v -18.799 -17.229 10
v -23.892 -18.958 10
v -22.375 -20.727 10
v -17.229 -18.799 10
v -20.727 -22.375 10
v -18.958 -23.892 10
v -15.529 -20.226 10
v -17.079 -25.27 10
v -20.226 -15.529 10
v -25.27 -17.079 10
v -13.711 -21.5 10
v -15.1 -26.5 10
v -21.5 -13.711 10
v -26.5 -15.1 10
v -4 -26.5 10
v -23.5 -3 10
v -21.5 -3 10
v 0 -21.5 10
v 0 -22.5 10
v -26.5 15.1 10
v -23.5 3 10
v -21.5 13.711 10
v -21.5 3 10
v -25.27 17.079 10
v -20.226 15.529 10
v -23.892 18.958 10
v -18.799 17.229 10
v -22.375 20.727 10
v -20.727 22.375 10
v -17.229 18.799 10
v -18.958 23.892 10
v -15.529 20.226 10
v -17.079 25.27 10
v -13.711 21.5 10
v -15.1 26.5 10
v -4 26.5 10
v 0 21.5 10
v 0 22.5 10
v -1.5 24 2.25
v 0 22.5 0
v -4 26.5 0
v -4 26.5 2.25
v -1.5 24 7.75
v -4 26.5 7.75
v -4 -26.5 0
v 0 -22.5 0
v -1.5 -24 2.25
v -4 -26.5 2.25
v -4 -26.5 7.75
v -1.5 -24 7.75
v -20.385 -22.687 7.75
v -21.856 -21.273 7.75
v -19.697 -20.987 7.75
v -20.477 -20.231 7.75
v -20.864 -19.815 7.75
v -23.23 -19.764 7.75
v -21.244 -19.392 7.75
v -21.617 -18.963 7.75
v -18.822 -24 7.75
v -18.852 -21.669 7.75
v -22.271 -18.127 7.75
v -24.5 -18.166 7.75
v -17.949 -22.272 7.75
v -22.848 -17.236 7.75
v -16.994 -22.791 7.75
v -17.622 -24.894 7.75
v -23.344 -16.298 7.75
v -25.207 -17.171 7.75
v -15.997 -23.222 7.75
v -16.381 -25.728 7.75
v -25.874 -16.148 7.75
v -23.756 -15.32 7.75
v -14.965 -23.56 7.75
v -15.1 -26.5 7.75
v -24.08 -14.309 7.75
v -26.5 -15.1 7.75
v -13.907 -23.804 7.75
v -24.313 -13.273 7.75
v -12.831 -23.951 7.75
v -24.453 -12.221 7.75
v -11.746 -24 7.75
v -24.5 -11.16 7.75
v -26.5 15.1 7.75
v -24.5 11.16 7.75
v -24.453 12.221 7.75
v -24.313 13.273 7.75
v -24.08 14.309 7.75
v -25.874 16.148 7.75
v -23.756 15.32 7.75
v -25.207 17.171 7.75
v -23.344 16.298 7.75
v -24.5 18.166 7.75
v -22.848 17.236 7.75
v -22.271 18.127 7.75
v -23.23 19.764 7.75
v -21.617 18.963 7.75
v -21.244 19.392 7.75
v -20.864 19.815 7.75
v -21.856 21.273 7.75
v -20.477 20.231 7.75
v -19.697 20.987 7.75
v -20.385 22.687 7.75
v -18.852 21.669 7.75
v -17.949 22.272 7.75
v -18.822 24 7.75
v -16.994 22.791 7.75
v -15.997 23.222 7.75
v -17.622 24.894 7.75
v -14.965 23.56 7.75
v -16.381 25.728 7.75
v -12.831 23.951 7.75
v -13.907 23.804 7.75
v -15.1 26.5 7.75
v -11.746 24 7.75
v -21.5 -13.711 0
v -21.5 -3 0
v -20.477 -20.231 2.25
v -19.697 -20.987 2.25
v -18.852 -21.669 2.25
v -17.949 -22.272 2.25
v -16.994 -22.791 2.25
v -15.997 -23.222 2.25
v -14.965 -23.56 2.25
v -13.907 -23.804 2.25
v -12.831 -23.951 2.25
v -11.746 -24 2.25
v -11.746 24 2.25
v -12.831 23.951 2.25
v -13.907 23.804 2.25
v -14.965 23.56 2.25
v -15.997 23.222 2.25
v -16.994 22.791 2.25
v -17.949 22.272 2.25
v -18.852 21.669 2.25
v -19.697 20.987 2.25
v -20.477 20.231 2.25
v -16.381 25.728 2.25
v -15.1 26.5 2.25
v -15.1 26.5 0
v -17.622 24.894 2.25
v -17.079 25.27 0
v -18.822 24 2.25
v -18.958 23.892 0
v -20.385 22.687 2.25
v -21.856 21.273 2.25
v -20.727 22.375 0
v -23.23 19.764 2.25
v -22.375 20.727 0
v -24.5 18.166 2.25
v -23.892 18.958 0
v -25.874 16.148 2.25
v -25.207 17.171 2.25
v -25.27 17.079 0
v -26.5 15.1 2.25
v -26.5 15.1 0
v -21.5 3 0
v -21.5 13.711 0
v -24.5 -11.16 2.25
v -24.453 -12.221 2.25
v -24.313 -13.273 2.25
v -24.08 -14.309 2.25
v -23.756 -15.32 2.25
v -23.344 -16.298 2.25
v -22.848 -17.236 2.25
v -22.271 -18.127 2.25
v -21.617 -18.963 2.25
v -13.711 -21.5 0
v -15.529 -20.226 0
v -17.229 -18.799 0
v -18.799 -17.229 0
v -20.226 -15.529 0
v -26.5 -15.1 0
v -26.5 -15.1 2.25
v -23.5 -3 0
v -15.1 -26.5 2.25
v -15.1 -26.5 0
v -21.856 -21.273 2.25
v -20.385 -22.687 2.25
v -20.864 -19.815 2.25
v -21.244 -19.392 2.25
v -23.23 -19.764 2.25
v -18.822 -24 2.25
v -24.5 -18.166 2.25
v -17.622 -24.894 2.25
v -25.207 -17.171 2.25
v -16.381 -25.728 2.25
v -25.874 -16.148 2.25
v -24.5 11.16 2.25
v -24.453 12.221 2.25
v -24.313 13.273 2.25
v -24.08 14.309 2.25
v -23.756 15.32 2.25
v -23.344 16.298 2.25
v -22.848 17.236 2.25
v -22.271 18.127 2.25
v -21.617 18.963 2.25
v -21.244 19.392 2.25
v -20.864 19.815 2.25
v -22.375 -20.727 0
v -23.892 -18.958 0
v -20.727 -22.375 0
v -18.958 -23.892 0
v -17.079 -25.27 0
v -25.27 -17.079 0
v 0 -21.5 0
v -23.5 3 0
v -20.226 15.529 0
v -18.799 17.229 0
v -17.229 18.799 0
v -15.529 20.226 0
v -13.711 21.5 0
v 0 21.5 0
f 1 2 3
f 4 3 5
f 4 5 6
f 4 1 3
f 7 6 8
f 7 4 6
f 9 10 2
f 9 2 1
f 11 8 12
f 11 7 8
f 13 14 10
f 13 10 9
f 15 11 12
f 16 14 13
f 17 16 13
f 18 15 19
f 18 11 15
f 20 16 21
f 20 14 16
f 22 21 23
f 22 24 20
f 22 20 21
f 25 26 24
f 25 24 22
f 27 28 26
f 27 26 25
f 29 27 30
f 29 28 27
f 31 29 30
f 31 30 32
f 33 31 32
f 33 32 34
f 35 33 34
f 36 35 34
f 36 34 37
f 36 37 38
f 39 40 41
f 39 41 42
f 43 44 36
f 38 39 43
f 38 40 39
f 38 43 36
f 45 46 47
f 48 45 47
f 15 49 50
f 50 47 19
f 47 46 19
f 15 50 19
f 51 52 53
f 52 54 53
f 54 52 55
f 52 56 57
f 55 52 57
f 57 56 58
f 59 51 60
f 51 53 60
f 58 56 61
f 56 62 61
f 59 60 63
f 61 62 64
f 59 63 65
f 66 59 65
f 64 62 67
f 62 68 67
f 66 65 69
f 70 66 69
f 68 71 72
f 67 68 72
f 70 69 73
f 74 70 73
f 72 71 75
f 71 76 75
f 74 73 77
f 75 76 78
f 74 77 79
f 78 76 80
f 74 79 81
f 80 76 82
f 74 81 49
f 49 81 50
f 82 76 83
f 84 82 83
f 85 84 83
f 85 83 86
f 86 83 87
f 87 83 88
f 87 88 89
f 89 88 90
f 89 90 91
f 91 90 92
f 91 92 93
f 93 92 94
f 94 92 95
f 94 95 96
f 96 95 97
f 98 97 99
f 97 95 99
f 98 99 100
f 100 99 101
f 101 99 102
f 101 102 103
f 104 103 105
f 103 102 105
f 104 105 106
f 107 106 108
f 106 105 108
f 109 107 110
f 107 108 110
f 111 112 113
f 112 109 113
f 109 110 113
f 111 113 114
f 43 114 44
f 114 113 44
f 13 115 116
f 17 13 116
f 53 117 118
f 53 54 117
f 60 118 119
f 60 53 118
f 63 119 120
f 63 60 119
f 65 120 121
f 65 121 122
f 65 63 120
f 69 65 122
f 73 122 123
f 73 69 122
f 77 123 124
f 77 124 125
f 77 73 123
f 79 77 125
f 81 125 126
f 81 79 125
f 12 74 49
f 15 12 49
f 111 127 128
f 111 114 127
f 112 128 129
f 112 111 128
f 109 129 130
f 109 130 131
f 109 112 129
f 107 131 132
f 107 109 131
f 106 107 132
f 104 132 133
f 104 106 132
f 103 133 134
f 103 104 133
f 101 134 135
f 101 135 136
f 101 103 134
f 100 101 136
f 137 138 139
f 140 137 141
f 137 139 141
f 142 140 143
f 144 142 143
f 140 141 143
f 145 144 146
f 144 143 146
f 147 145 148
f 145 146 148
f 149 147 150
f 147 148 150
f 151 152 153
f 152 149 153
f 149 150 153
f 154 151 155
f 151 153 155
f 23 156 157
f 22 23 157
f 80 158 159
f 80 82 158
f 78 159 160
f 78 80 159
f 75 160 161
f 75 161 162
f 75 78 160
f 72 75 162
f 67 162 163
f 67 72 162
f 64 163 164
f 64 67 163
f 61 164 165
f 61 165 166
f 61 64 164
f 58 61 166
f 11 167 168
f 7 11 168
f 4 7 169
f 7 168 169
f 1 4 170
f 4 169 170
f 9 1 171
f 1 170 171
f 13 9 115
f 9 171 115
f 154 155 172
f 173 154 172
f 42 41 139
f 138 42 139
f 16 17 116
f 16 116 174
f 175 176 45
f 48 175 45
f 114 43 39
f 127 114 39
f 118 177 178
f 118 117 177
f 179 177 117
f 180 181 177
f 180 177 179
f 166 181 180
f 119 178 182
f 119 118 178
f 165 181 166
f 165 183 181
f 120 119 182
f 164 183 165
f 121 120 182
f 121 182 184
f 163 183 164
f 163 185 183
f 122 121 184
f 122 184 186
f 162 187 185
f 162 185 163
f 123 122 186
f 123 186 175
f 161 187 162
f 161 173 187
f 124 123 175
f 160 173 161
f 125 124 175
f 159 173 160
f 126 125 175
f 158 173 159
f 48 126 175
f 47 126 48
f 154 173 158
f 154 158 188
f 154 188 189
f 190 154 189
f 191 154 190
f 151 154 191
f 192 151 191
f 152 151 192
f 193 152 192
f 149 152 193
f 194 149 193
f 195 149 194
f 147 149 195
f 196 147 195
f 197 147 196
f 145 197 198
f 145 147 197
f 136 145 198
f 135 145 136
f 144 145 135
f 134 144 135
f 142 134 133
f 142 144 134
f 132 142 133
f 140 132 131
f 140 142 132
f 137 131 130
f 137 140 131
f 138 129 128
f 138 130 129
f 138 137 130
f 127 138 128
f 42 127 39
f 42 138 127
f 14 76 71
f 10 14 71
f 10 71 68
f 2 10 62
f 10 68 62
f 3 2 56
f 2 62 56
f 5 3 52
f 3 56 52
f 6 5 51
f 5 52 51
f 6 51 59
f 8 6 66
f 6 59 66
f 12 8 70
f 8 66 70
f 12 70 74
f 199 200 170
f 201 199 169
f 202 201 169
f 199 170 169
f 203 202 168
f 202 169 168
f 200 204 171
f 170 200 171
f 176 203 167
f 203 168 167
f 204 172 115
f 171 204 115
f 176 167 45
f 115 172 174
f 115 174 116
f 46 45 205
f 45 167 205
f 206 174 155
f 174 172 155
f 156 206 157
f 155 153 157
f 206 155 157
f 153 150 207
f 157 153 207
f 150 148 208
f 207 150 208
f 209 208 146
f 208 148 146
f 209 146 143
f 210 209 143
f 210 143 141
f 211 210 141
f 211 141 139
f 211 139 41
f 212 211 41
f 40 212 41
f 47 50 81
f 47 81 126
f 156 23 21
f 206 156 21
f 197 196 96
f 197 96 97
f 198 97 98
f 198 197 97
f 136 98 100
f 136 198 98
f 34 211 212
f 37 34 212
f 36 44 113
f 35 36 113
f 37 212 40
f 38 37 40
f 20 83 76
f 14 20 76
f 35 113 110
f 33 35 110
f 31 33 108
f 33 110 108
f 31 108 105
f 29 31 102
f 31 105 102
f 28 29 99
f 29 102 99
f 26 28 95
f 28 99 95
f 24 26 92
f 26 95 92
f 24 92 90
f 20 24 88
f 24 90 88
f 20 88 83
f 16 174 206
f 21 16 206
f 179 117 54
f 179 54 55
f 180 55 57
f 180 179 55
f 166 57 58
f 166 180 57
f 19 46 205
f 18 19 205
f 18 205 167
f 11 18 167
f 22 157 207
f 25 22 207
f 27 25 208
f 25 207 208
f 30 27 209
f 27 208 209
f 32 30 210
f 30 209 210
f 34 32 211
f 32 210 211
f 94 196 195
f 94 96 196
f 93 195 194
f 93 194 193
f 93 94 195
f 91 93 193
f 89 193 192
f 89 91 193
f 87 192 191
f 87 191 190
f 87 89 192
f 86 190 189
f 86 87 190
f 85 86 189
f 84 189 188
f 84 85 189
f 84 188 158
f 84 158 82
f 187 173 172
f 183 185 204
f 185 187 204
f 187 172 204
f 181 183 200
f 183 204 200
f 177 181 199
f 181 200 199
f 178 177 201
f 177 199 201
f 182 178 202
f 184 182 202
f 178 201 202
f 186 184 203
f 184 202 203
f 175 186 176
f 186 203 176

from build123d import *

# Parameters (mm, degrees)
BOSS_EXTRUDE1_DEPTH     = 10
CUT_EXTRUDE1_DEPTH      = 47.99468055
SKETCH8_W               = 5.5
SKETCH8_H               = 5
CUT_EXTRUDE7_DEPTH      = 47.99468055
CUT_EXTRUDE8_DEPTH      = 52.994106262
CUT_EXTRUDE8_DEPTH_BACK = 52.994106262
SKETCH9_W               = 4
SKETCH9_H               = 5.5
FILLET4_R               = 1.5
CUT_EXTRUDE9_DEPTH      = 5.5
CHAMFER1_SIZE           = 4
SKETCH11_W              = 11
SKETCH11_H              = 16.199337742
SKETCH11_W_2            = 4
SKETCH11_H_2            = 6
CUT_EXTRUDE10_DEPTH     = 47.99468055
FILLET5_R               = 12


with BuildPart() as part:
    # Sketch1 → Boss-Extrude1 (new body)
    with BuildSketch(Plane.XY):
        with BuildLine():
            Line((-26.5, -8.099668871), (-26.5, -15.099668871))
            ThreePointArc((-26.5, -15.099668871), (-21.566756826, -21.566756826), (-15.099668871, -26.5))
            Line((-15.099668871, -26.5), (0, -26.5))
            Line((0, -26.5), (0, -21.5))
            Line((0, -21.5), (-13.711309201, -21.5))
            ThreePointArc((-13.711309201, -21.5), (-18.03122292, -18.03122292), (-21.5, -13.711309201))
            Line((-21.5, -13.711309201), (-21.5, 13.711309201))
            ThreePointArc((-21.5, 13.711309201), (-18.03122292, 18.03122292), (-13.711309201, 21.5))
            Line((-13.711309201, 21.5), (0, 21.5))
            Line((0, 21.5), (0, 26.5))
            Line((0, 26.5), (-15.099668871, 26.5))
            ThreePointArc((-15.099668871, 26.5), (-21.566756826, 21.566756826), (-26.5, 15.099668871))
            Line((-26.5, 15.099668871), (-26.5, 8.099668871))
            Line((-26.5, 8.099668871), (-37.5, 8.099668871))
            Line((-37.5, 8.099668871), (-37.5, -8.099668871))
            Line((-37.5, -8.099668871), (-26.5, -8.099668871))
        make_face()
    extrude(amount=BOSS_EXTRUDE1_DEPTH)

    # Sketch2 → Cut-Extrude1 (cut, through all)
    with BuildSketch(Plane.XY.offset(10)):
        with BuildLine():
            Line((-31, 2.907722565), (-31, -2.907722565))
            ThreePointArc((-31, -2.907722565), (-33, -4.907722565), (-35, -2.907722565))
            Line((-35, -2.907722565), (-35, 2.907722565))
            ThreePointArc((-35, 2.907722565), (-33, 4.907722565), (-31, 2.907722565))
        make_face()
    extrude(amount=-CUT_EXTRUDE1_DEPTH, mode=Mode.SUBTRACT)

    # Sketch8 → Cut-Extrude7 (cut, through all)
    with BuildSketch(Plane(origin=(0, 0, 0), x_dir=(0, 0, -1), z_dir=(1, 0, 0))):
        with Locations((-5, 26.5)):
            Rectangle(SKETCH8_W, SKETCH8_H)
        with Locations((-5, -26.5)):
            Rectangle(SKETCH8_W, SKETCH8_H)
    extrude(amount=-CUT_EXTRUDE7_DEPTH, mode=Mode.SUBTRACT)

    # Sketch9 → Cut-Extrude8 (cut, two sides: drawn at the far end of the back side and taken through both)
    with BuildSketch(Plane.XZ.offset(8.099668871).offset(-CUT_EXTRUDE8_DEPTH_BACK)):
        with Locations((-26.5, 5)):
            Rectangle(SKETCH9_W, SKETCH9_H)
    extrude(amount=CUT_EXTRUDE8_DEPTH + CUT_EXTRUDE8_DEPTH_BACK, mode=Mode.SUBTRACT)

    # Fillet4
    fillet4_edges = [part.edges().sort_by_distance(p)[0] for p in [
        (-28.5, 0, 2.25),
        (-28.5, 0, 7.75),
    ]]
    fillet(fillet4_edges, radius=FILLET4_R)

    # Sketch10 → Cut-Extrude9 (cut)
    with BuildSketch(Plane.XY.offset(2.25)):
        with BuildLine():
            Line((-16.314836512, 24), (-18.821530225, 24))
            ThreePointArc((-18.821530225, 24), (-21.856301603, 21.273271498), (-24.5, 18.165902125))
            Line((-24.5, 18.165902125), (-24.5, 15.08975312))
            ThreePointArc((-24.5, 15.08975312), (-20.789536476, 19.895899393), (-16.314836512, 24))
        make_face()
        with BuildLine():
            Line((-24.5, -15.08975312), (-24.5, -18.165902125))
            ThreePointArc((-24.5, -18.165902125), (-21.856301603, -21.273271498), (-18.821530225, -24))
            Line((-18.821530225, -24), (-16.314836512, -24))
            ThreePointArc((-16.314836512, -24), (-20.789536476, -19.895899393), (-24.5, -15.08975312))
        make_face()
    extrude(amount=CUT_EXTRUDE9_DEPTH, mode=Mode.SUBTRACT)

    # Chamfer1
    chamfer1_edges = [part.edges().sort_by_distance(p)[0] for p in [
        (0, -26.5, 8.875),
        (0, 26.5, 8.875),
    ]]
    chamfer(chamfer1_edges, length=CHAMFER1_SIZE)

    # Sketch11 → Cut-Extrude10 (cut, through all)
    with BuildSketch(Plane(origin=(0, 0, 0), x_dir=(-1, 0, 0), z_dir=(0, 0, -1))):
        with Locations((32, 0)):
            Rectangle(SKETCH11_W, SKETCH11_H)
        with Locations((21.5, 0)):
            Rectangle(SKETCH11_W_2, SKETCH11_H_2)
    extrude(amount=-CUT_EXTRUDE10_DEPTH, mode=Mode.SUBTRACT)

    # Fillet5
    fillet5_edges = [part.edges().sort_by_distance(p)[0] for p in [
        (-24.5, 15.08975312, 5),
        (-16.314836512, 24, 5),
        (-16.314836512, -24, 5),
        (-24.5, -15.08975312, 5),
    ]]
    fillet(fillet5_edges, radius=FILLET5_R)


solid = part.part
